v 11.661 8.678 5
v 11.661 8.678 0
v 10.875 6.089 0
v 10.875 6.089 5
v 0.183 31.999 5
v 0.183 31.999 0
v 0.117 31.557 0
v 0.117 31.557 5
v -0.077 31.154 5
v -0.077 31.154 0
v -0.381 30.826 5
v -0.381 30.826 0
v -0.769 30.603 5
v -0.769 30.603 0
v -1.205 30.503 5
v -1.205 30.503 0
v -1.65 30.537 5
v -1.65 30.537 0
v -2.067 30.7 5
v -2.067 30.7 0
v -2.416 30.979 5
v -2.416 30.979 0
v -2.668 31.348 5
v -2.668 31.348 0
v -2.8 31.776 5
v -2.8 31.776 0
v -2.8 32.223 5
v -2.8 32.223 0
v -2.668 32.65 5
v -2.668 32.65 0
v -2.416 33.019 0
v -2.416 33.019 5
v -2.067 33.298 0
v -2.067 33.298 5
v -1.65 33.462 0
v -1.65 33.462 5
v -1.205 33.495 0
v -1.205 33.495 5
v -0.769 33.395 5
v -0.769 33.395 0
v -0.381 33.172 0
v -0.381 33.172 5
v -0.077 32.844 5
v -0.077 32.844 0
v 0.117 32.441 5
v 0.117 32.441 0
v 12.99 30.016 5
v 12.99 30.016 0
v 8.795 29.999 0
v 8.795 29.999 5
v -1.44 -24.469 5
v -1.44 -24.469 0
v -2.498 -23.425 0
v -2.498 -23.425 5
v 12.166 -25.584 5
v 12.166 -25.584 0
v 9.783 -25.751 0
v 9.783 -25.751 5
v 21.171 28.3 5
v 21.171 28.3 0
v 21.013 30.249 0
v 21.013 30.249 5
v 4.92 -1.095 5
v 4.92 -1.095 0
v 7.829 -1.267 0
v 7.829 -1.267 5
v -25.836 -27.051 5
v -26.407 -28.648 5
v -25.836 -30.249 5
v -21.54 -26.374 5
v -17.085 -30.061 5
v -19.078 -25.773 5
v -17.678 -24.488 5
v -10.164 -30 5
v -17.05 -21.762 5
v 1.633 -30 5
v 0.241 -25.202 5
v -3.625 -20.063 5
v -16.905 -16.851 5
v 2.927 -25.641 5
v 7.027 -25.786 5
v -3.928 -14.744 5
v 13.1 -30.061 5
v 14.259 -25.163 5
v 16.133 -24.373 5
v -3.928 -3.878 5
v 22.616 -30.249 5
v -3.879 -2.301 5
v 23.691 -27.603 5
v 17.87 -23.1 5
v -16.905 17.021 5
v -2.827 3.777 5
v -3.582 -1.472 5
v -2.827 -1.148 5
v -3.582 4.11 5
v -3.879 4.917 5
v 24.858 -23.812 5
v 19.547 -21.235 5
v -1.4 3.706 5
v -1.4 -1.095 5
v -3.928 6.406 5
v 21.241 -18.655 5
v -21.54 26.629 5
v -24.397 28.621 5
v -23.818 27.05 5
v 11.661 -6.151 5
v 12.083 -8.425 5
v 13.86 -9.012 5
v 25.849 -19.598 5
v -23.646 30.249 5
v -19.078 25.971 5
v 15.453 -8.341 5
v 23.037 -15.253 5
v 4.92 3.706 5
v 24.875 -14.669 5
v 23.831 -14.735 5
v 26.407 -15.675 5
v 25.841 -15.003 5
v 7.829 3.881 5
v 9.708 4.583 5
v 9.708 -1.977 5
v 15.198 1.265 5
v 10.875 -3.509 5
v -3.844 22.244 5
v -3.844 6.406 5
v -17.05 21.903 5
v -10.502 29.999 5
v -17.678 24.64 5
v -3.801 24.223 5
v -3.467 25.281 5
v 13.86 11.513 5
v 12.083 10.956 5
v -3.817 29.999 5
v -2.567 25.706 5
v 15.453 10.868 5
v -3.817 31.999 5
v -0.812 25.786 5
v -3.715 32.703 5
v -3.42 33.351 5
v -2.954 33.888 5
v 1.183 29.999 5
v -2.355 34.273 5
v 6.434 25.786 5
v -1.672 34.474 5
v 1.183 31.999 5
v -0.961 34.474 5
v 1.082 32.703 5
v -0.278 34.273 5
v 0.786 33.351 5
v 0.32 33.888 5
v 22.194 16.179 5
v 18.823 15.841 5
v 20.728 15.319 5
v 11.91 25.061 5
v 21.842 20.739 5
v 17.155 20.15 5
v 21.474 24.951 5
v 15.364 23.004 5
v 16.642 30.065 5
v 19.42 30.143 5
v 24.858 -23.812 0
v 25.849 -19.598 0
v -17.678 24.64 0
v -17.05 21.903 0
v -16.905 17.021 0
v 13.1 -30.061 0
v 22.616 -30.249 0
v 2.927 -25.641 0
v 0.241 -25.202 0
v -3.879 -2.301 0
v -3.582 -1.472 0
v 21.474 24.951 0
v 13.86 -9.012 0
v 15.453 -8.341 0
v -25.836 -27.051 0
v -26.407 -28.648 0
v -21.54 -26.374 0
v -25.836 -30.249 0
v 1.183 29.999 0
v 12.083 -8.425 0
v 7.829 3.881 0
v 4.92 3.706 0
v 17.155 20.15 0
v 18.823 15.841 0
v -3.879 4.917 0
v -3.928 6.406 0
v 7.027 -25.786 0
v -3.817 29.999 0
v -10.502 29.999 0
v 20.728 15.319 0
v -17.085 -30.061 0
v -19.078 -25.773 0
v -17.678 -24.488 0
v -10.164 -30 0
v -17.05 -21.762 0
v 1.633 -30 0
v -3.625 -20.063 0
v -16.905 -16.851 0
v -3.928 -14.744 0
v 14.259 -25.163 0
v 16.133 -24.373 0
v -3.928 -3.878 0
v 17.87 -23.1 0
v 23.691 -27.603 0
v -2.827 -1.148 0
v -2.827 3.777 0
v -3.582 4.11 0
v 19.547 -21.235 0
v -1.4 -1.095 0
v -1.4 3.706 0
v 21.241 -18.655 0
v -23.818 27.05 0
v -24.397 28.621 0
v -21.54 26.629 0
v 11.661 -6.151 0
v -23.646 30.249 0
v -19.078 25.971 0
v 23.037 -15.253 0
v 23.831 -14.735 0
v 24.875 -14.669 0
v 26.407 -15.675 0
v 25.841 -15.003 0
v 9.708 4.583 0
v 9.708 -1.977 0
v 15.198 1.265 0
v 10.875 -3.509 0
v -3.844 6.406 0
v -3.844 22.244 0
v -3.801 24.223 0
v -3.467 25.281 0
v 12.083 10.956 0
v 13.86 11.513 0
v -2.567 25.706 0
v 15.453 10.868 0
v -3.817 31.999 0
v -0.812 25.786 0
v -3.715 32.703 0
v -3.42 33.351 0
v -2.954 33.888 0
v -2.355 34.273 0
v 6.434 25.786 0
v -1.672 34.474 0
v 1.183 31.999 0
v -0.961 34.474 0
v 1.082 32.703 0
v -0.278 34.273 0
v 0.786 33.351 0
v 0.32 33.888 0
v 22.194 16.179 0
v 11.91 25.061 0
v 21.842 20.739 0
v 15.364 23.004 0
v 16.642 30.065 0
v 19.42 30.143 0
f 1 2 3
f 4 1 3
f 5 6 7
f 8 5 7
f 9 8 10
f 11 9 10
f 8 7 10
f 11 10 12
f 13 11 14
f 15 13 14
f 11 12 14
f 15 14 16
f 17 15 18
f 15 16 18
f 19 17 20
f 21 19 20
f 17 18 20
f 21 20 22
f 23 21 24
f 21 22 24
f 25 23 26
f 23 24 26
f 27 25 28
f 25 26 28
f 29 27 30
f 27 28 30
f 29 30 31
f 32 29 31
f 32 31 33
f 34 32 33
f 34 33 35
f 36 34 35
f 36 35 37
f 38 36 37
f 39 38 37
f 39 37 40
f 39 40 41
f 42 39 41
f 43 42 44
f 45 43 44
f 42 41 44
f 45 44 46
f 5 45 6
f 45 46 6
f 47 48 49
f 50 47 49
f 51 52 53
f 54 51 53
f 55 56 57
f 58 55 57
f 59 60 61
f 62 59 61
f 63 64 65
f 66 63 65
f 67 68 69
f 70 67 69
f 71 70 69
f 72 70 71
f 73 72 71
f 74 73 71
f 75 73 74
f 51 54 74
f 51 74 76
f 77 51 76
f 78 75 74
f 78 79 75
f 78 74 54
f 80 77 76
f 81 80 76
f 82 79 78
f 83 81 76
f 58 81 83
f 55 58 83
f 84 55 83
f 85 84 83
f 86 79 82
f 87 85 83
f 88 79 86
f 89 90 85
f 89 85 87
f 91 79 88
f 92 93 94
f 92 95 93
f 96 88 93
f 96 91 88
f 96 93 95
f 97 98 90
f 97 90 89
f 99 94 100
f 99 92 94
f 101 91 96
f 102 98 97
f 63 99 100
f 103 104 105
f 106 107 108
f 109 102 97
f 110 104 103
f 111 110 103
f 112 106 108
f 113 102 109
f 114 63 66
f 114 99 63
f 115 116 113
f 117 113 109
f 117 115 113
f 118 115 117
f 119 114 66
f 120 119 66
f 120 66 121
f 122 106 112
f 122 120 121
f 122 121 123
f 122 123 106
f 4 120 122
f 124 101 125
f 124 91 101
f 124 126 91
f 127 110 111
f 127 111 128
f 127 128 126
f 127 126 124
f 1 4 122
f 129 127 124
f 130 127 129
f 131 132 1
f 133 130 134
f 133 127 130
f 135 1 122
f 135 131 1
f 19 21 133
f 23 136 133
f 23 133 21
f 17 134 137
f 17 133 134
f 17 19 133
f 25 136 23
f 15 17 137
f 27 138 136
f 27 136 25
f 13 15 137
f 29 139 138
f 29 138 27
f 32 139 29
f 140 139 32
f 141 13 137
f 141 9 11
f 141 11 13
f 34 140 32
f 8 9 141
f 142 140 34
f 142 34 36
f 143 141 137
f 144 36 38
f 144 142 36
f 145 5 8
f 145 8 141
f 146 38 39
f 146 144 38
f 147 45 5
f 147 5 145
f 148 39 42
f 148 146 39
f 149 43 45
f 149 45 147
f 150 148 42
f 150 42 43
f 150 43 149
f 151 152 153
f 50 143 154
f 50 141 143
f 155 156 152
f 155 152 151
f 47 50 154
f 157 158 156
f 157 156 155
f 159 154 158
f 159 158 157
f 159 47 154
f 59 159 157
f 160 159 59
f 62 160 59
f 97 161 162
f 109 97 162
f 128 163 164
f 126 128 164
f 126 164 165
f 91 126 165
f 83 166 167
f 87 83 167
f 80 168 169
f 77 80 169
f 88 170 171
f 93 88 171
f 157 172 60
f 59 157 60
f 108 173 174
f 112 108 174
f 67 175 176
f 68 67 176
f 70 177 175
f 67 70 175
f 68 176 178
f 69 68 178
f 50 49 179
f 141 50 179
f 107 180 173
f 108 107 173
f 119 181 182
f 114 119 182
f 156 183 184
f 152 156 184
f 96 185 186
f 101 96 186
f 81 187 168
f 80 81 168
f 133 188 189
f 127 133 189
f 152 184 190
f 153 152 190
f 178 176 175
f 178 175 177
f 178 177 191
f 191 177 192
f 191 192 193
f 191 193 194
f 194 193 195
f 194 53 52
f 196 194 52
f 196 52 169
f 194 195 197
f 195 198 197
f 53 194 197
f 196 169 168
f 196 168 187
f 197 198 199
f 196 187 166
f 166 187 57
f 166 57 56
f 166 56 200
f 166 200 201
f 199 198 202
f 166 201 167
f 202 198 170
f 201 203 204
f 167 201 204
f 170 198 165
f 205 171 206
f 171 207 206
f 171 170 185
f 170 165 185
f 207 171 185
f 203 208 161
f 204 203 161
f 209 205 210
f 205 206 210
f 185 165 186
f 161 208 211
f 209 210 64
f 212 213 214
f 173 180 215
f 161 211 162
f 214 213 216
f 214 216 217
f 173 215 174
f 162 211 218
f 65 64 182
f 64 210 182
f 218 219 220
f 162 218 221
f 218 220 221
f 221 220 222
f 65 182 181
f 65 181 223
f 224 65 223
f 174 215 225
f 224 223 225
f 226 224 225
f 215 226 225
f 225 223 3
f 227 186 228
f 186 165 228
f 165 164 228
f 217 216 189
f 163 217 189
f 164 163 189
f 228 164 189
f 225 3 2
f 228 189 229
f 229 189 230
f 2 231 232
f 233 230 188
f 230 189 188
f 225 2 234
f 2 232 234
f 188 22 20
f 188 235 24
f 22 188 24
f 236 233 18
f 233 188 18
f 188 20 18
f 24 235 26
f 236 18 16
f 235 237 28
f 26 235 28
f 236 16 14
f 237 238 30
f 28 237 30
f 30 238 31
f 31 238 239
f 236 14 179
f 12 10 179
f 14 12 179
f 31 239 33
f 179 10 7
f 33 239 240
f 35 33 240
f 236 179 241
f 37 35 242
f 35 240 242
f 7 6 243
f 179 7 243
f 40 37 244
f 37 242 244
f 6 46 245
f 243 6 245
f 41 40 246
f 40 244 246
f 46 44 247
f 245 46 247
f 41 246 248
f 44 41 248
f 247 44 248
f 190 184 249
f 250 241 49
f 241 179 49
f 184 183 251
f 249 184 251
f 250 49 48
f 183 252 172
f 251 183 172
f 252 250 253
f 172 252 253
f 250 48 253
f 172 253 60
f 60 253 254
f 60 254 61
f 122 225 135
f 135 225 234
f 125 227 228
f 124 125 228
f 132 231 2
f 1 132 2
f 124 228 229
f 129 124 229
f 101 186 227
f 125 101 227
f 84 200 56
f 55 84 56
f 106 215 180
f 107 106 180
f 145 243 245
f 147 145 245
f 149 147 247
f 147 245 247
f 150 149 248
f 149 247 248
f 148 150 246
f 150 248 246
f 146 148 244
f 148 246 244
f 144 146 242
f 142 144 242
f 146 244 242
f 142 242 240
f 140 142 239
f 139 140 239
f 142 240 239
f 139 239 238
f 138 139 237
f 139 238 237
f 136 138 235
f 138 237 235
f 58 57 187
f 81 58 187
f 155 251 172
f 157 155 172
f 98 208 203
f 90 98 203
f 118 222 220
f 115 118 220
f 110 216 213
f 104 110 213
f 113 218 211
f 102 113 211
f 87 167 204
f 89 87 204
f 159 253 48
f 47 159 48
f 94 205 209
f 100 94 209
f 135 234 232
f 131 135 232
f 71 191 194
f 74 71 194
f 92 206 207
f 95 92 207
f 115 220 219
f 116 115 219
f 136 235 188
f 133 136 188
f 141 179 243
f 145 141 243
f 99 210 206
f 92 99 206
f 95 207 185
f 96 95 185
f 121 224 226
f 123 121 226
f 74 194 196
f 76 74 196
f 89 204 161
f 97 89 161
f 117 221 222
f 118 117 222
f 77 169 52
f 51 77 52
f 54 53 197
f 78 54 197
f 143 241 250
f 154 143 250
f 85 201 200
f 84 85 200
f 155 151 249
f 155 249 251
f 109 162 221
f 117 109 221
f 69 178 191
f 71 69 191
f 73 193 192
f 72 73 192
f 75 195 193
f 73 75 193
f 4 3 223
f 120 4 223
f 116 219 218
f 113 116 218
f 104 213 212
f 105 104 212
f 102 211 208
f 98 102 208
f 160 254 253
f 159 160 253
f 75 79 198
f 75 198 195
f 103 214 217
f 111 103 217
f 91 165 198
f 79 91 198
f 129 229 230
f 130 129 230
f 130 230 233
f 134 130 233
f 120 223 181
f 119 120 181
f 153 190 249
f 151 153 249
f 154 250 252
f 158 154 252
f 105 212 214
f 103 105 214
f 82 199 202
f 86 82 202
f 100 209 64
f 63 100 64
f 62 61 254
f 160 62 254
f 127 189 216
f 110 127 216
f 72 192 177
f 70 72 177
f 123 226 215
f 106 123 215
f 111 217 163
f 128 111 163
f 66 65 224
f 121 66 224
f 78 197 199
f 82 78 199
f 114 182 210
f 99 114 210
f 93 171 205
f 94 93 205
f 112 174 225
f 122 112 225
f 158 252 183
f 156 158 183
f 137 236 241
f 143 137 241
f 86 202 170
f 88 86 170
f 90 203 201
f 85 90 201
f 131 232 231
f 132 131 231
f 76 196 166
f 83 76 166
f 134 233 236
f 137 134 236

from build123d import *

# Parameters (mm, degrees)
F1_DEPTH = 5
F3_DEPTH = 5


with BuildPart() as f1:
    # F0 (on Top) → F1 (new body)
    with BuildSketch(Plane.XY):
        Polygon((-3.879217, 4.916668), (-3.927753, 6.405906), (-3.844433, 6.405906), (-3.844433, 22.24392), (-3.800751, 24.223369), (-3.466664, 25.280638), (-2.567135, 25.706135), (-0.81176, 25.786219), (6.433814, 25.786219), (11.910261, 25.061419), (15.364386, 23.003504), (17.155354, 20.150413), (18.823365, 15.84125), (20.727583, 15.318682), (22.194171, 16.179382), (21.842287, 20.738504), (21.474225, 24.951404), (21.170876, 28.300369), (21.013135, 30.249078), (19.420355, 30.143108), (16.641685, 30.064642), (12.990181, 30.016107), (8.795077, 29.999119), (-10.501916, 29.999119), (-23.646198, 30.249078), (-24.396884, 28.620705), (-23.8185, 27.049765), (-21.539748, 26.629122), (-19.078178, 25.970654), (-17.677922, 24.639967), (-17.050194, 21.902552), (-16.905395, 17.021477), (-16.905395, -16.850793), (-17.050194, -21.761799), (-17.677922, -24.487888), (-19.078178, -25.773276), (-21.539748, -26.37431), (-25.835968, -27.050574), (-26.407071, -28.648208), (-25.835968, -30.249078), (-17.084978, -30.060598), (-10.163784, -29.999928), (1.632822, -29.999928), (13.100195, -30.060598), (22.615623, -30.249078), (23.690689, -27.603072), (24.857973, -23.811624), (25.848911, -19.597915), (26.407071, -15.674611), (25.840821, -15.0032), (24.874961, -14.669112), (23.831443, -14.735444), (23.037075, -15.253159), (21.241253, -18.654704), (19.547356, -21.235186), (17.870447, -23.099767), (16.132869, -24.37302), (14.258581, -25.162535), (12.165882, -25.583987), (9.782779, -25.751435), (7.026759, -25.786219), (2.927108, -25.64142), (0.241465, -25.202172), (-1.440297, -24.469283), (-2.497567, -23.424956), (-3.625214, -20.063048), (-3.927753, -14.744343), (-3.927753, -3.878004), (-3.879217, -2.301402), (-3.581532, -1.47225), (-2.826801, -1.14787), (-1.399851, -1.095289), (4.920309, -1.095289), (7.829216, -1.266782), (9.707548, -1.977022), (10.874832, -3.509133), (11.661111, -6.151093), (12.082563, -8.424992), (13.859779, -9.012274), (15.453369, -8.340863), (15.197747, 1.265164), (15.453369, 10.867956), (13.859779, 11.513482), (12.082563, 10.95613), (11.661111, 8.678187), (10.874832, 6.088806), (9.707548, 4.58339), (7.829216, 3.88124), (4.920309, 3.705702), (-1.399851, 3.705702), (-2.826801, 3.776888), (-3.581532, 4.110166), align=None)
    extrude(amount=F1_DEPTH)

    # F2 (on Top) → F3 (join)
    with BuildSketch(Plane.XY):
        with BuildLine():
            ThreePointArc((-2.816698, 31.999119), (-1.316698, 33.499119), (0.183302, 31.999119))
            Line((0.183302, 31.999119), (1.183302, 31.999119))
            ThreePointArc((1.183302, 31.999119), (-1.316698, 34.499119), (-3.816698, 31.999119))
            Line((-3.816698, 31.999119), (-2.816698, 31.999119))
        make_face()
        with BuildLine():
            Line((1.183302, 31.999119), (0.183302, 31.999119))
            ThreePointArc((0.183302, 31.999119), (-1.316698, 30.499119), (-2.816698, 31.999119))
            Line((-2.816698, 31.999119), (-3.816698, 31.999119))
            Line((-3.816698, 31.999119), (-3.816698, 29.999119))
            Line((-3.816698, 29.999119), (1.183302, 29.999119))
            Line((1.183302, 29.999119), (1.183302, 31.999119))
        make_face()
    extrude(amount=F3_DEPTH)


solid = f1.part
